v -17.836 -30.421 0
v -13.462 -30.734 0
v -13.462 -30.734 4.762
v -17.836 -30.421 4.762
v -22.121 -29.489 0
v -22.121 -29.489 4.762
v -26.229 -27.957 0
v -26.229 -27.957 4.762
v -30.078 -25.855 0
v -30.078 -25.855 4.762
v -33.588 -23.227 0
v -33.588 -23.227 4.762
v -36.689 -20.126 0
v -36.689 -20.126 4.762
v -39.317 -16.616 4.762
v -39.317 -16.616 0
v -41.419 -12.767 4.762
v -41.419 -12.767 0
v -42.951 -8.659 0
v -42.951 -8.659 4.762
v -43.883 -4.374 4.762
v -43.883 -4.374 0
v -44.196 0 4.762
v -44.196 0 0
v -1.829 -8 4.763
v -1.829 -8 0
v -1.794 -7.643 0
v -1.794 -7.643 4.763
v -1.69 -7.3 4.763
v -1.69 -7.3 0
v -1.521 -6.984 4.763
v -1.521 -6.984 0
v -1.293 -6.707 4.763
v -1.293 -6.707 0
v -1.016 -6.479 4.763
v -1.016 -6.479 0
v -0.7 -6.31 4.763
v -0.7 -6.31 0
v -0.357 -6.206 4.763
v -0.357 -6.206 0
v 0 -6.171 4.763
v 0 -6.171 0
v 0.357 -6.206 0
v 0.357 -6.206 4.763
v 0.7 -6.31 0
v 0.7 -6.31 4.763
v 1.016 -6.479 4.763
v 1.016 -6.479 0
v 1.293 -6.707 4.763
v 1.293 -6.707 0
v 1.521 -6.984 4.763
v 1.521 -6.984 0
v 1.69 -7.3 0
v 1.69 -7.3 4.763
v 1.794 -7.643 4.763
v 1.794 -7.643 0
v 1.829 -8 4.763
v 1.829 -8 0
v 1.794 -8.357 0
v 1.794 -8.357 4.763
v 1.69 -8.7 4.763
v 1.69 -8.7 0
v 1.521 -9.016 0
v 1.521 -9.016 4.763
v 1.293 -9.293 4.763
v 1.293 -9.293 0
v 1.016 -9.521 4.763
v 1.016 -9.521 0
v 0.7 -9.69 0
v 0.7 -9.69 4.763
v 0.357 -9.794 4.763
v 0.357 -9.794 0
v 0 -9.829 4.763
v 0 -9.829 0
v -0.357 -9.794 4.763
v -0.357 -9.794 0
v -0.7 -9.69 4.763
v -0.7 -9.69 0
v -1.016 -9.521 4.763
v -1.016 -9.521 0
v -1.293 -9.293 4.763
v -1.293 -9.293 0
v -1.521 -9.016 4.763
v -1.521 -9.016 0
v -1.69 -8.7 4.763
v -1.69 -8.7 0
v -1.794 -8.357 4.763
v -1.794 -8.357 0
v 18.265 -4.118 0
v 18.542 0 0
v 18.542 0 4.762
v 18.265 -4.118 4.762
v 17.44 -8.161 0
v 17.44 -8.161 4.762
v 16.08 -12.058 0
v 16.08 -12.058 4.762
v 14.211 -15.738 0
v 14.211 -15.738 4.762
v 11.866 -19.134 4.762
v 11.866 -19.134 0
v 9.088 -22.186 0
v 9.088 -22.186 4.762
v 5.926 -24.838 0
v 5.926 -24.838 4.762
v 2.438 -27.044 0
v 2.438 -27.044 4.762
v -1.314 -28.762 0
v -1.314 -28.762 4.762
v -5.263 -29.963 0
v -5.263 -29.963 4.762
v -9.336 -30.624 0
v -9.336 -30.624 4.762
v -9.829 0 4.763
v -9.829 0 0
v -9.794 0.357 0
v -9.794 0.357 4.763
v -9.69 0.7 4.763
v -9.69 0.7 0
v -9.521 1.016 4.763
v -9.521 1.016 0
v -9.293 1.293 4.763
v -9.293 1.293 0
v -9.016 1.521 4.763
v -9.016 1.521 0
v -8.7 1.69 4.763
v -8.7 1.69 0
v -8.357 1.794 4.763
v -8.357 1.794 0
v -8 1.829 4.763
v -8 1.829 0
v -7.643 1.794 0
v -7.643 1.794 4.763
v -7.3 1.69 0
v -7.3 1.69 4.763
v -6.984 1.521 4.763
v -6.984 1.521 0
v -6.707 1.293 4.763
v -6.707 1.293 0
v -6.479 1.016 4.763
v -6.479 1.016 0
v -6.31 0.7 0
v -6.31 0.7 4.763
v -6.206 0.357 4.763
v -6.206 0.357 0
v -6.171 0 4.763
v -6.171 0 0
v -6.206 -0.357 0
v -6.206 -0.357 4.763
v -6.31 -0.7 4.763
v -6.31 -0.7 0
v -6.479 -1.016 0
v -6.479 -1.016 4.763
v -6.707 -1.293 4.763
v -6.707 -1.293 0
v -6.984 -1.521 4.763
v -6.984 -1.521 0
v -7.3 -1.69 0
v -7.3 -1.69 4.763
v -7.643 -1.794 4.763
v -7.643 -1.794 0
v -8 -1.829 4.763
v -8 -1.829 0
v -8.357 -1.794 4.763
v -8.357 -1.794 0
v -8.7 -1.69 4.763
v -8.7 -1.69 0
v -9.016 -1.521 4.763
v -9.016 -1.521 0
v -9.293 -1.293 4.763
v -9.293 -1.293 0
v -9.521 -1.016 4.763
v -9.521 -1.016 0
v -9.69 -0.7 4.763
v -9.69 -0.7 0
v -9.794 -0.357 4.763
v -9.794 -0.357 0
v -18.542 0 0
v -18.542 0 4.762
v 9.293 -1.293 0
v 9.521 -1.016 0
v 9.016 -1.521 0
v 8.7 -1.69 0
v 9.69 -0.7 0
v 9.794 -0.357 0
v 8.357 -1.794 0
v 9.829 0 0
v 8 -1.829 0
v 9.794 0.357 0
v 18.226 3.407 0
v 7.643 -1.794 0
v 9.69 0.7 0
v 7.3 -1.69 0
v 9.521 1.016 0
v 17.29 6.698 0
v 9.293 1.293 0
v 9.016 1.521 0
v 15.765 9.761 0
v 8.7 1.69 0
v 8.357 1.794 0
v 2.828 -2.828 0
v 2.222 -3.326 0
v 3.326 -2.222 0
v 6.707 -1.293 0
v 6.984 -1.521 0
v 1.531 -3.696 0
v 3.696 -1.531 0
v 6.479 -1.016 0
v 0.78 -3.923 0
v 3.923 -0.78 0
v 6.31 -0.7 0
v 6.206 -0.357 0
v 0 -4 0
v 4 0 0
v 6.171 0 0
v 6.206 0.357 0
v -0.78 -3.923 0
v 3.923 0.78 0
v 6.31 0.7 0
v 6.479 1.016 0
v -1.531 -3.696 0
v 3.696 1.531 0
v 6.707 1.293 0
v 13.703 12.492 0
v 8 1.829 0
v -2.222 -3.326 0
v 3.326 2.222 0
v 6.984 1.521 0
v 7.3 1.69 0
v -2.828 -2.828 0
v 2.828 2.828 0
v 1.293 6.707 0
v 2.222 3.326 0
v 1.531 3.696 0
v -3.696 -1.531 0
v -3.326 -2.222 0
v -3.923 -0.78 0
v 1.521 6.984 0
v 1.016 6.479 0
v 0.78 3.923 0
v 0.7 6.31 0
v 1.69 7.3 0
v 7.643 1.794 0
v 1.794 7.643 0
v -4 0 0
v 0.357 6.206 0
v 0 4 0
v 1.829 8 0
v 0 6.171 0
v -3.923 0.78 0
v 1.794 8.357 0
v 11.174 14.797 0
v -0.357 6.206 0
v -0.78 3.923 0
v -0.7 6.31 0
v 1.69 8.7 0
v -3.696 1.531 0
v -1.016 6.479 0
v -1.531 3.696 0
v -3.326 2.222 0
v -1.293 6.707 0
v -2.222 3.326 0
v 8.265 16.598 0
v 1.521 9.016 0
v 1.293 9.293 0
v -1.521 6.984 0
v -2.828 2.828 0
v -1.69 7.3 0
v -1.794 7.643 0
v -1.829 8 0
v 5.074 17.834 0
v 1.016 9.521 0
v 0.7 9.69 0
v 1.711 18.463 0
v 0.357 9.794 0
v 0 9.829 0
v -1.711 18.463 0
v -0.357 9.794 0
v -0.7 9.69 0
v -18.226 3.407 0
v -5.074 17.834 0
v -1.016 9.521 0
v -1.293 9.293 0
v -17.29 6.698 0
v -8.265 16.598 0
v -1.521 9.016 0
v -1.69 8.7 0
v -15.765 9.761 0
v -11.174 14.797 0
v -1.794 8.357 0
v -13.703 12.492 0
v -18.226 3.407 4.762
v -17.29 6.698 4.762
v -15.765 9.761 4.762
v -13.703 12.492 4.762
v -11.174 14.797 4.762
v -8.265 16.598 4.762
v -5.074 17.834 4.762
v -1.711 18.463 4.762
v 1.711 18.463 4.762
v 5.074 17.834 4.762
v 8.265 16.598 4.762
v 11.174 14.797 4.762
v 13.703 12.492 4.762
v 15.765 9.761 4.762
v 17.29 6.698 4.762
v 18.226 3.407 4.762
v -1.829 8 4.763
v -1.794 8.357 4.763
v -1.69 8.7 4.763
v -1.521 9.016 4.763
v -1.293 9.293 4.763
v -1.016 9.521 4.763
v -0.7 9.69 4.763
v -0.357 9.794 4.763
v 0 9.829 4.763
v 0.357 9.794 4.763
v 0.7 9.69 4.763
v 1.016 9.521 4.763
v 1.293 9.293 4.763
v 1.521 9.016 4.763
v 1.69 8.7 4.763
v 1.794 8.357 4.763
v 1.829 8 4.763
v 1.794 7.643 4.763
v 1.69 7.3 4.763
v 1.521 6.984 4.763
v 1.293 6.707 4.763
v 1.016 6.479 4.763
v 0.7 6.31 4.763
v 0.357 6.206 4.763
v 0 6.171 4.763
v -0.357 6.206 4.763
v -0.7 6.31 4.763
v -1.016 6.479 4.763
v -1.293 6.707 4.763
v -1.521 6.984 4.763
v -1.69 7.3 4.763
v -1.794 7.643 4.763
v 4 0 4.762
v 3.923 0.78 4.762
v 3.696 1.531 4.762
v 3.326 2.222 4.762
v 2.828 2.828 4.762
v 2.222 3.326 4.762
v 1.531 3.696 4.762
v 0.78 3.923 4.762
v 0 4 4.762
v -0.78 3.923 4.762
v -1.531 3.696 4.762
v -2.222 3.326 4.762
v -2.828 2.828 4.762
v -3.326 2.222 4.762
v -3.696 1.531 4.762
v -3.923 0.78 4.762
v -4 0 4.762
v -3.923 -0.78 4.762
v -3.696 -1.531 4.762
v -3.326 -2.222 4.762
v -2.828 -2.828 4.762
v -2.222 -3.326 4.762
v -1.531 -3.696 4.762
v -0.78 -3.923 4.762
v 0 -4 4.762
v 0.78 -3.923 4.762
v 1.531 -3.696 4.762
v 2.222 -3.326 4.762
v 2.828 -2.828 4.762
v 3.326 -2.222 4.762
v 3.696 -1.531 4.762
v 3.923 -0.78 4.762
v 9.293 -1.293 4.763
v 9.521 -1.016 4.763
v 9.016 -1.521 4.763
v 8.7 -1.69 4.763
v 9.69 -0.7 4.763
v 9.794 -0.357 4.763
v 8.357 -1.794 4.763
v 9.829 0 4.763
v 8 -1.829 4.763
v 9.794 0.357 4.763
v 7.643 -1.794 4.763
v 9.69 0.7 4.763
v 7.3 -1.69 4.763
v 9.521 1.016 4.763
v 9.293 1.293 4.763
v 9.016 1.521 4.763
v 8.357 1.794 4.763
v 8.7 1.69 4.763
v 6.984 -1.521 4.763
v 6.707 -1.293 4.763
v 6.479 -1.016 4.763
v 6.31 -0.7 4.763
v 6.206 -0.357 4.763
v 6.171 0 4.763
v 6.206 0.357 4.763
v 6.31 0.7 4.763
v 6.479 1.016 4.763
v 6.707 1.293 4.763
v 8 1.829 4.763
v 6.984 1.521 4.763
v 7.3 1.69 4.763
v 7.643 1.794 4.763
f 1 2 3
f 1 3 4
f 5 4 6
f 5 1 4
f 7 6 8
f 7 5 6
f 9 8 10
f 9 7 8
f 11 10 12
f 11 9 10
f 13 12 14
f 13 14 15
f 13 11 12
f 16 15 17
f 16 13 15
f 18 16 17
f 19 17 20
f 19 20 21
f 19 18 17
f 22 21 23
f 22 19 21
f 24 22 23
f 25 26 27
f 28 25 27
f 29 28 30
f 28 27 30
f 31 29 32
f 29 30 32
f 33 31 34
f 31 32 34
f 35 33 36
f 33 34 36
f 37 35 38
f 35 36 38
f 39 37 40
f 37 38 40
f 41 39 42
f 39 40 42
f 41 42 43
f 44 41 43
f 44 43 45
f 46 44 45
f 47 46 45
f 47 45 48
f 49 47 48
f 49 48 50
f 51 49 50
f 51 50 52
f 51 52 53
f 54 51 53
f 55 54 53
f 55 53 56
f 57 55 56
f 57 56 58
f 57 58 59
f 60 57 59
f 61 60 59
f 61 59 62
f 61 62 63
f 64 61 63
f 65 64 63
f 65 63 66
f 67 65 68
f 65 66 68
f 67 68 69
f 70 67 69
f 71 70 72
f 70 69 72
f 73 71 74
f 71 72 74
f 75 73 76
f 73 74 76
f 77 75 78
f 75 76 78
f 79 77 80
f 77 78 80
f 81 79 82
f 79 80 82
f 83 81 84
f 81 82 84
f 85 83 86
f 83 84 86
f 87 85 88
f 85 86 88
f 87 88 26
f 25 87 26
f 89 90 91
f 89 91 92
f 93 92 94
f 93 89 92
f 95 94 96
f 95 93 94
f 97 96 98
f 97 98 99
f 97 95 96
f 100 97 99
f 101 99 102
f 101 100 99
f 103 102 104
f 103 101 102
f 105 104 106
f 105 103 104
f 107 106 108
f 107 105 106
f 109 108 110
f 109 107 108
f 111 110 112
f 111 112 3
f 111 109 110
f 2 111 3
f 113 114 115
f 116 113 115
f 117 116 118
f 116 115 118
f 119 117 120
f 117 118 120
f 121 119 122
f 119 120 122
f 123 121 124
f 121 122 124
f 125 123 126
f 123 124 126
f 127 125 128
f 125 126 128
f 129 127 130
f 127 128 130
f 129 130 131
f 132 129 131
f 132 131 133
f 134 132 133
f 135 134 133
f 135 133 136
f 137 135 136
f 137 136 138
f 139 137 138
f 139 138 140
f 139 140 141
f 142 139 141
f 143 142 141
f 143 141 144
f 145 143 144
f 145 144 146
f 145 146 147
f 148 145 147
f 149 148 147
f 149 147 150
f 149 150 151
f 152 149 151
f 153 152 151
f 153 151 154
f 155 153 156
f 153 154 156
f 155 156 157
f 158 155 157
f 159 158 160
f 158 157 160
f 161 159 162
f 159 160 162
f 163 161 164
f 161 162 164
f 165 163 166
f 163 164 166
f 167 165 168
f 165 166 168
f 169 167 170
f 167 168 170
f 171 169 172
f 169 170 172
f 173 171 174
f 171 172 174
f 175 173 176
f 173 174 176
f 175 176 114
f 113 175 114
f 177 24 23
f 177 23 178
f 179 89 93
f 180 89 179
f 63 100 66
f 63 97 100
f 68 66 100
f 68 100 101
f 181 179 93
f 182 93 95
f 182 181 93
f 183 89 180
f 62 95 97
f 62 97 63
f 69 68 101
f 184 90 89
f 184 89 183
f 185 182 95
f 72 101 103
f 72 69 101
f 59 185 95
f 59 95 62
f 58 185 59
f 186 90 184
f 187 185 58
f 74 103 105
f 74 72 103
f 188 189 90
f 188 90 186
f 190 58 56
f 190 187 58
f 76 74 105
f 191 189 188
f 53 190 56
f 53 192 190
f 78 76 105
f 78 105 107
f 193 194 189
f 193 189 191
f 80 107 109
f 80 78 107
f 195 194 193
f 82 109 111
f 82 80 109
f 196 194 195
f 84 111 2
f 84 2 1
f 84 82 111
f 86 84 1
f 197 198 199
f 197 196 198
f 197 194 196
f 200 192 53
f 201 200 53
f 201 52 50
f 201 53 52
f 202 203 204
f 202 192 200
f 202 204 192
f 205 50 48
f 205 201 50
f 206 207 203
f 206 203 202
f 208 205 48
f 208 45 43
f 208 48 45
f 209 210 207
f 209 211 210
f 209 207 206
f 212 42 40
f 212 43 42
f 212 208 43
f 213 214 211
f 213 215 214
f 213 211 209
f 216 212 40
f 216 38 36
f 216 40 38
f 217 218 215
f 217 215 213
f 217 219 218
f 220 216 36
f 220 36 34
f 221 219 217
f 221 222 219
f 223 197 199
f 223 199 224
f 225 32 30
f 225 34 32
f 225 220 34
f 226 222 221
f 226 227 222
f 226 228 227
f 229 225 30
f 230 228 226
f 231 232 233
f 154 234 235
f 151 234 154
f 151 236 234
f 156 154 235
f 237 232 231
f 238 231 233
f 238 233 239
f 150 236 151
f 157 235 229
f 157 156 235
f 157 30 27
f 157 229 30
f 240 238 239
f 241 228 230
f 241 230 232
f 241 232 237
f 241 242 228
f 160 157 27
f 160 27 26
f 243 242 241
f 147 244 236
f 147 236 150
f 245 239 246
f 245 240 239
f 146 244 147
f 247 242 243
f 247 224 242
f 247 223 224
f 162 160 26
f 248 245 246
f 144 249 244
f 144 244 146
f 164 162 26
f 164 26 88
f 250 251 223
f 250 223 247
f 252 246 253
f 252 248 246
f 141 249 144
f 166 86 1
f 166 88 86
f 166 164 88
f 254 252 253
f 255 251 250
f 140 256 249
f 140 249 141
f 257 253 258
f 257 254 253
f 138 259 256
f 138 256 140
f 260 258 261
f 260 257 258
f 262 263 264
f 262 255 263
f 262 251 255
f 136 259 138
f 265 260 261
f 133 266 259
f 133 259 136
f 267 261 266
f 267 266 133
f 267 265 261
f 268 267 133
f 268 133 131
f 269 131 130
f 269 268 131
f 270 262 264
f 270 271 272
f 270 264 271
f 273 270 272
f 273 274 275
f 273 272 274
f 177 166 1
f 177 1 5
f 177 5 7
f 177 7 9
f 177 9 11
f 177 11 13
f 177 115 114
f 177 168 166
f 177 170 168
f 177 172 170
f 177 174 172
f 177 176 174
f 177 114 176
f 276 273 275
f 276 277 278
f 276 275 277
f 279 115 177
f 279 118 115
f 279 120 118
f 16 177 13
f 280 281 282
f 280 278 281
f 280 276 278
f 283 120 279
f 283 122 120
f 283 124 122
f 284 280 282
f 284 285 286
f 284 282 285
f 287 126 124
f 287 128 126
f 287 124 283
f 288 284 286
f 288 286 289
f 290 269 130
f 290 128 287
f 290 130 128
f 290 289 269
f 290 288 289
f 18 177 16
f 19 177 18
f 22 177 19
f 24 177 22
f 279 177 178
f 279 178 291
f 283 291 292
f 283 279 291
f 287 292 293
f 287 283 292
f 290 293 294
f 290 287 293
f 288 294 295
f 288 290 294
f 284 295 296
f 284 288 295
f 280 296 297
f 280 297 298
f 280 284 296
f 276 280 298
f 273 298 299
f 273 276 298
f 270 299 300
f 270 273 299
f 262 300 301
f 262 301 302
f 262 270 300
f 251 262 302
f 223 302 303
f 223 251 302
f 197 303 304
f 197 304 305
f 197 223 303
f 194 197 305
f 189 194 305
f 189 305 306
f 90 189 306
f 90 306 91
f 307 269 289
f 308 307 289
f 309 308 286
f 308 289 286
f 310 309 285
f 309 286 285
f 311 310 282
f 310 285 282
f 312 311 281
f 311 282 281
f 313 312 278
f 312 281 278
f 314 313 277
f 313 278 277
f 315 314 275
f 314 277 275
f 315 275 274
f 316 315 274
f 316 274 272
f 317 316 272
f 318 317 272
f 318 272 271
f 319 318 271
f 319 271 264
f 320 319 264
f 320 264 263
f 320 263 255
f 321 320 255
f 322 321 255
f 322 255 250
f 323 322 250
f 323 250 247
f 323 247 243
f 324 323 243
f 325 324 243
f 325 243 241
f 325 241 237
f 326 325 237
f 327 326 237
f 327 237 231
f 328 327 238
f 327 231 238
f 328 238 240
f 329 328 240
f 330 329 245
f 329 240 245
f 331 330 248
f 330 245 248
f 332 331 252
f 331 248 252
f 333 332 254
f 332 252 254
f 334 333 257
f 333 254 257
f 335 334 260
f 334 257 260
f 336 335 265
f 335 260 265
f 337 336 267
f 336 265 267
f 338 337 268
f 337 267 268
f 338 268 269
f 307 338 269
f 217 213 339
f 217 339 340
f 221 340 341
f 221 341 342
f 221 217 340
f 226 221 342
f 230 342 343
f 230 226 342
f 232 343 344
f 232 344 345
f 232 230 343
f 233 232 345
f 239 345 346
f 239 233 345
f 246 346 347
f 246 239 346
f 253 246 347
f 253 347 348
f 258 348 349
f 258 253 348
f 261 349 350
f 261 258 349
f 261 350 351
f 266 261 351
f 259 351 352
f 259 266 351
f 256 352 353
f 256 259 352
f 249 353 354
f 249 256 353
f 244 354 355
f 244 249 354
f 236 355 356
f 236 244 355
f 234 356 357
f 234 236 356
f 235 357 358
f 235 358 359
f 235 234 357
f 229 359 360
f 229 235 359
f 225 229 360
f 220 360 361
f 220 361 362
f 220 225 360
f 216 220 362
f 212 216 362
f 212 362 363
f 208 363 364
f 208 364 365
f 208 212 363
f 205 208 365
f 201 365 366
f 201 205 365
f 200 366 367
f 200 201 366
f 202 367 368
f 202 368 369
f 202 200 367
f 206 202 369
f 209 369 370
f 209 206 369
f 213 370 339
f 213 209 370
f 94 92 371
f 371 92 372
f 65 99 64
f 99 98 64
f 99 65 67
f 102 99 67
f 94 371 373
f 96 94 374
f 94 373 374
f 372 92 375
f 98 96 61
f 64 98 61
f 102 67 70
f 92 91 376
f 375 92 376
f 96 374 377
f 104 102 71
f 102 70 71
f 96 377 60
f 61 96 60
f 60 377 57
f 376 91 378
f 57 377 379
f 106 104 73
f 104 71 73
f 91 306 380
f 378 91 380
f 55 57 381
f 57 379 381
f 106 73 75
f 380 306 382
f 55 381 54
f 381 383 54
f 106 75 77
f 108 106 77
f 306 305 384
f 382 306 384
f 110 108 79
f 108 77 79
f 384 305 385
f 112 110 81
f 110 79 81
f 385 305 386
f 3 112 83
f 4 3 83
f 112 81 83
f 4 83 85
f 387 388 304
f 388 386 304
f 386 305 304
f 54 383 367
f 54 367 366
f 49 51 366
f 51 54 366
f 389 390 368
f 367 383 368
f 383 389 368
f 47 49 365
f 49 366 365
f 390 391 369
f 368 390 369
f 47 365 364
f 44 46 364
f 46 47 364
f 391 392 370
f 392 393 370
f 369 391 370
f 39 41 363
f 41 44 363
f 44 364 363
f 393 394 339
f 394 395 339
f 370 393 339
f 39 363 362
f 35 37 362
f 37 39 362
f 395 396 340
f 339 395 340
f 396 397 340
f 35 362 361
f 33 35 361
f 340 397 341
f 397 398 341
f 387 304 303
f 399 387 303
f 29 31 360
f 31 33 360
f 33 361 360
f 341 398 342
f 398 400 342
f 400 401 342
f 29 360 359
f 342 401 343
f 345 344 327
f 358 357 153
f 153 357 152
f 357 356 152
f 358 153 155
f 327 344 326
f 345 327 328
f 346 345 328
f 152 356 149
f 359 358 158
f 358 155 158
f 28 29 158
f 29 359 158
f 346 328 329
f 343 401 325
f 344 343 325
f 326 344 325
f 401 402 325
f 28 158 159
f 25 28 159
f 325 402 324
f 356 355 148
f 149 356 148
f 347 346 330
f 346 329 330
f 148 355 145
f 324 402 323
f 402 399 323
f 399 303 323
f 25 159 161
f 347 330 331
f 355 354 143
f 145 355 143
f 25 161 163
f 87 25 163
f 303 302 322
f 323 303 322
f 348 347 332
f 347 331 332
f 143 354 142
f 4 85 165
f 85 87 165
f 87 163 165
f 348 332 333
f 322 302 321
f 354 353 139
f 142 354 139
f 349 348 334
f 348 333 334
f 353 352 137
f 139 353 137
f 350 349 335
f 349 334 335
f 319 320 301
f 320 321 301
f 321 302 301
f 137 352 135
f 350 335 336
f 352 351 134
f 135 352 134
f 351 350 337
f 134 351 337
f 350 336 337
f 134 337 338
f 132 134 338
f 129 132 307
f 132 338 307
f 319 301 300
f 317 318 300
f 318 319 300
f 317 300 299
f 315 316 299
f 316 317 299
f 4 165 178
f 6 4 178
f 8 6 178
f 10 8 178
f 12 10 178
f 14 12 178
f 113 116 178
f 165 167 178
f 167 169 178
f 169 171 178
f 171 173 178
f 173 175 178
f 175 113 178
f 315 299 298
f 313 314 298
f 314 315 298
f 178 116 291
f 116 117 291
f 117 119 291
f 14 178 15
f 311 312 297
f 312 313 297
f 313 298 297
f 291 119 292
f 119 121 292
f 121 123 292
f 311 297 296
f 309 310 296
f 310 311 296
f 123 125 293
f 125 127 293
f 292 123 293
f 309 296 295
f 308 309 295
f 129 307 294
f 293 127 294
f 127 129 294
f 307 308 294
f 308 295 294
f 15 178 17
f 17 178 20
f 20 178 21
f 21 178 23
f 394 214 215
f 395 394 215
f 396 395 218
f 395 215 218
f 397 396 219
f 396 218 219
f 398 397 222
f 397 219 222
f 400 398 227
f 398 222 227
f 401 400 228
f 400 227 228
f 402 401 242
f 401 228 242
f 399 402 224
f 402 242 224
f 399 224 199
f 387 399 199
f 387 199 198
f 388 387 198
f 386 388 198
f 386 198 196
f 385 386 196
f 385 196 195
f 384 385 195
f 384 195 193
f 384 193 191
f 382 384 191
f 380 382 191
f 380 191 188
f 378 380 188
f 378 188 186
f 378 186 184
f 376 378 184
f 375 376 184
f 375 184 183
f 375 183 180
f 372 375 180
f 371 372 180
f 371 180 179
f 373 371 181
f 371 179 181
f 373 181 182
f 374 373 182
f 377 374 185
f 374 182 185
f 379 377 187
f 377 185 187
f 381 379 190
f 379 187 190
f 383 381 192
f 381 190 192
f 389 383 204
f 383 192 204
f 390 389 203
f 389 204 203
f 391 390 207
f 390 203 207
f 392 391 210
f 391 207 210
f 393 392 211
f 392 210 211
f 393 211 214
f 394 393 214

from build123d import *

# Parameters (mm, degrees)
SKETCH1_R             = 4
BOSS_EXTRUDE1_DEPTH   = 4.7625
F_6_CLEARANCE_HOLE1_D = 3.6576


with BuildPart() as part:
    # Sketch1 → Boss-Extrude1 (new body)
    with BuildSketch(Plane.XY):
        with BuildLine():
            Line((-44.196, 0), (-18.542, 0))
            ThreePointArc((-18.542, 0), (0, 18.542), (18.542, 0))
            ThreePointArc((18.542, 0), (9.088190436, -22.185776818), (-13.462, -30.734))
            ThreePointArc((-13.462, -30.734), (-35.194219813, -21.732219813), (-44.196, 0))
        make_face()
        Circle(SKETCH1_R, mode=Mode.SUBTRACT)
    extrude(amount=BOSS_EXTRUDE1_DEPTH)

    # #6 Clearance Hole1 (through all)
    with Locations(Plane.XY.offset(4.7625)):
        with Locations((0, 8), (8, 0), (0, -8), (-8, 0)):
            Hole(F_6_CLEARANCE_HOLE1_D / 2)


solid = part.part
